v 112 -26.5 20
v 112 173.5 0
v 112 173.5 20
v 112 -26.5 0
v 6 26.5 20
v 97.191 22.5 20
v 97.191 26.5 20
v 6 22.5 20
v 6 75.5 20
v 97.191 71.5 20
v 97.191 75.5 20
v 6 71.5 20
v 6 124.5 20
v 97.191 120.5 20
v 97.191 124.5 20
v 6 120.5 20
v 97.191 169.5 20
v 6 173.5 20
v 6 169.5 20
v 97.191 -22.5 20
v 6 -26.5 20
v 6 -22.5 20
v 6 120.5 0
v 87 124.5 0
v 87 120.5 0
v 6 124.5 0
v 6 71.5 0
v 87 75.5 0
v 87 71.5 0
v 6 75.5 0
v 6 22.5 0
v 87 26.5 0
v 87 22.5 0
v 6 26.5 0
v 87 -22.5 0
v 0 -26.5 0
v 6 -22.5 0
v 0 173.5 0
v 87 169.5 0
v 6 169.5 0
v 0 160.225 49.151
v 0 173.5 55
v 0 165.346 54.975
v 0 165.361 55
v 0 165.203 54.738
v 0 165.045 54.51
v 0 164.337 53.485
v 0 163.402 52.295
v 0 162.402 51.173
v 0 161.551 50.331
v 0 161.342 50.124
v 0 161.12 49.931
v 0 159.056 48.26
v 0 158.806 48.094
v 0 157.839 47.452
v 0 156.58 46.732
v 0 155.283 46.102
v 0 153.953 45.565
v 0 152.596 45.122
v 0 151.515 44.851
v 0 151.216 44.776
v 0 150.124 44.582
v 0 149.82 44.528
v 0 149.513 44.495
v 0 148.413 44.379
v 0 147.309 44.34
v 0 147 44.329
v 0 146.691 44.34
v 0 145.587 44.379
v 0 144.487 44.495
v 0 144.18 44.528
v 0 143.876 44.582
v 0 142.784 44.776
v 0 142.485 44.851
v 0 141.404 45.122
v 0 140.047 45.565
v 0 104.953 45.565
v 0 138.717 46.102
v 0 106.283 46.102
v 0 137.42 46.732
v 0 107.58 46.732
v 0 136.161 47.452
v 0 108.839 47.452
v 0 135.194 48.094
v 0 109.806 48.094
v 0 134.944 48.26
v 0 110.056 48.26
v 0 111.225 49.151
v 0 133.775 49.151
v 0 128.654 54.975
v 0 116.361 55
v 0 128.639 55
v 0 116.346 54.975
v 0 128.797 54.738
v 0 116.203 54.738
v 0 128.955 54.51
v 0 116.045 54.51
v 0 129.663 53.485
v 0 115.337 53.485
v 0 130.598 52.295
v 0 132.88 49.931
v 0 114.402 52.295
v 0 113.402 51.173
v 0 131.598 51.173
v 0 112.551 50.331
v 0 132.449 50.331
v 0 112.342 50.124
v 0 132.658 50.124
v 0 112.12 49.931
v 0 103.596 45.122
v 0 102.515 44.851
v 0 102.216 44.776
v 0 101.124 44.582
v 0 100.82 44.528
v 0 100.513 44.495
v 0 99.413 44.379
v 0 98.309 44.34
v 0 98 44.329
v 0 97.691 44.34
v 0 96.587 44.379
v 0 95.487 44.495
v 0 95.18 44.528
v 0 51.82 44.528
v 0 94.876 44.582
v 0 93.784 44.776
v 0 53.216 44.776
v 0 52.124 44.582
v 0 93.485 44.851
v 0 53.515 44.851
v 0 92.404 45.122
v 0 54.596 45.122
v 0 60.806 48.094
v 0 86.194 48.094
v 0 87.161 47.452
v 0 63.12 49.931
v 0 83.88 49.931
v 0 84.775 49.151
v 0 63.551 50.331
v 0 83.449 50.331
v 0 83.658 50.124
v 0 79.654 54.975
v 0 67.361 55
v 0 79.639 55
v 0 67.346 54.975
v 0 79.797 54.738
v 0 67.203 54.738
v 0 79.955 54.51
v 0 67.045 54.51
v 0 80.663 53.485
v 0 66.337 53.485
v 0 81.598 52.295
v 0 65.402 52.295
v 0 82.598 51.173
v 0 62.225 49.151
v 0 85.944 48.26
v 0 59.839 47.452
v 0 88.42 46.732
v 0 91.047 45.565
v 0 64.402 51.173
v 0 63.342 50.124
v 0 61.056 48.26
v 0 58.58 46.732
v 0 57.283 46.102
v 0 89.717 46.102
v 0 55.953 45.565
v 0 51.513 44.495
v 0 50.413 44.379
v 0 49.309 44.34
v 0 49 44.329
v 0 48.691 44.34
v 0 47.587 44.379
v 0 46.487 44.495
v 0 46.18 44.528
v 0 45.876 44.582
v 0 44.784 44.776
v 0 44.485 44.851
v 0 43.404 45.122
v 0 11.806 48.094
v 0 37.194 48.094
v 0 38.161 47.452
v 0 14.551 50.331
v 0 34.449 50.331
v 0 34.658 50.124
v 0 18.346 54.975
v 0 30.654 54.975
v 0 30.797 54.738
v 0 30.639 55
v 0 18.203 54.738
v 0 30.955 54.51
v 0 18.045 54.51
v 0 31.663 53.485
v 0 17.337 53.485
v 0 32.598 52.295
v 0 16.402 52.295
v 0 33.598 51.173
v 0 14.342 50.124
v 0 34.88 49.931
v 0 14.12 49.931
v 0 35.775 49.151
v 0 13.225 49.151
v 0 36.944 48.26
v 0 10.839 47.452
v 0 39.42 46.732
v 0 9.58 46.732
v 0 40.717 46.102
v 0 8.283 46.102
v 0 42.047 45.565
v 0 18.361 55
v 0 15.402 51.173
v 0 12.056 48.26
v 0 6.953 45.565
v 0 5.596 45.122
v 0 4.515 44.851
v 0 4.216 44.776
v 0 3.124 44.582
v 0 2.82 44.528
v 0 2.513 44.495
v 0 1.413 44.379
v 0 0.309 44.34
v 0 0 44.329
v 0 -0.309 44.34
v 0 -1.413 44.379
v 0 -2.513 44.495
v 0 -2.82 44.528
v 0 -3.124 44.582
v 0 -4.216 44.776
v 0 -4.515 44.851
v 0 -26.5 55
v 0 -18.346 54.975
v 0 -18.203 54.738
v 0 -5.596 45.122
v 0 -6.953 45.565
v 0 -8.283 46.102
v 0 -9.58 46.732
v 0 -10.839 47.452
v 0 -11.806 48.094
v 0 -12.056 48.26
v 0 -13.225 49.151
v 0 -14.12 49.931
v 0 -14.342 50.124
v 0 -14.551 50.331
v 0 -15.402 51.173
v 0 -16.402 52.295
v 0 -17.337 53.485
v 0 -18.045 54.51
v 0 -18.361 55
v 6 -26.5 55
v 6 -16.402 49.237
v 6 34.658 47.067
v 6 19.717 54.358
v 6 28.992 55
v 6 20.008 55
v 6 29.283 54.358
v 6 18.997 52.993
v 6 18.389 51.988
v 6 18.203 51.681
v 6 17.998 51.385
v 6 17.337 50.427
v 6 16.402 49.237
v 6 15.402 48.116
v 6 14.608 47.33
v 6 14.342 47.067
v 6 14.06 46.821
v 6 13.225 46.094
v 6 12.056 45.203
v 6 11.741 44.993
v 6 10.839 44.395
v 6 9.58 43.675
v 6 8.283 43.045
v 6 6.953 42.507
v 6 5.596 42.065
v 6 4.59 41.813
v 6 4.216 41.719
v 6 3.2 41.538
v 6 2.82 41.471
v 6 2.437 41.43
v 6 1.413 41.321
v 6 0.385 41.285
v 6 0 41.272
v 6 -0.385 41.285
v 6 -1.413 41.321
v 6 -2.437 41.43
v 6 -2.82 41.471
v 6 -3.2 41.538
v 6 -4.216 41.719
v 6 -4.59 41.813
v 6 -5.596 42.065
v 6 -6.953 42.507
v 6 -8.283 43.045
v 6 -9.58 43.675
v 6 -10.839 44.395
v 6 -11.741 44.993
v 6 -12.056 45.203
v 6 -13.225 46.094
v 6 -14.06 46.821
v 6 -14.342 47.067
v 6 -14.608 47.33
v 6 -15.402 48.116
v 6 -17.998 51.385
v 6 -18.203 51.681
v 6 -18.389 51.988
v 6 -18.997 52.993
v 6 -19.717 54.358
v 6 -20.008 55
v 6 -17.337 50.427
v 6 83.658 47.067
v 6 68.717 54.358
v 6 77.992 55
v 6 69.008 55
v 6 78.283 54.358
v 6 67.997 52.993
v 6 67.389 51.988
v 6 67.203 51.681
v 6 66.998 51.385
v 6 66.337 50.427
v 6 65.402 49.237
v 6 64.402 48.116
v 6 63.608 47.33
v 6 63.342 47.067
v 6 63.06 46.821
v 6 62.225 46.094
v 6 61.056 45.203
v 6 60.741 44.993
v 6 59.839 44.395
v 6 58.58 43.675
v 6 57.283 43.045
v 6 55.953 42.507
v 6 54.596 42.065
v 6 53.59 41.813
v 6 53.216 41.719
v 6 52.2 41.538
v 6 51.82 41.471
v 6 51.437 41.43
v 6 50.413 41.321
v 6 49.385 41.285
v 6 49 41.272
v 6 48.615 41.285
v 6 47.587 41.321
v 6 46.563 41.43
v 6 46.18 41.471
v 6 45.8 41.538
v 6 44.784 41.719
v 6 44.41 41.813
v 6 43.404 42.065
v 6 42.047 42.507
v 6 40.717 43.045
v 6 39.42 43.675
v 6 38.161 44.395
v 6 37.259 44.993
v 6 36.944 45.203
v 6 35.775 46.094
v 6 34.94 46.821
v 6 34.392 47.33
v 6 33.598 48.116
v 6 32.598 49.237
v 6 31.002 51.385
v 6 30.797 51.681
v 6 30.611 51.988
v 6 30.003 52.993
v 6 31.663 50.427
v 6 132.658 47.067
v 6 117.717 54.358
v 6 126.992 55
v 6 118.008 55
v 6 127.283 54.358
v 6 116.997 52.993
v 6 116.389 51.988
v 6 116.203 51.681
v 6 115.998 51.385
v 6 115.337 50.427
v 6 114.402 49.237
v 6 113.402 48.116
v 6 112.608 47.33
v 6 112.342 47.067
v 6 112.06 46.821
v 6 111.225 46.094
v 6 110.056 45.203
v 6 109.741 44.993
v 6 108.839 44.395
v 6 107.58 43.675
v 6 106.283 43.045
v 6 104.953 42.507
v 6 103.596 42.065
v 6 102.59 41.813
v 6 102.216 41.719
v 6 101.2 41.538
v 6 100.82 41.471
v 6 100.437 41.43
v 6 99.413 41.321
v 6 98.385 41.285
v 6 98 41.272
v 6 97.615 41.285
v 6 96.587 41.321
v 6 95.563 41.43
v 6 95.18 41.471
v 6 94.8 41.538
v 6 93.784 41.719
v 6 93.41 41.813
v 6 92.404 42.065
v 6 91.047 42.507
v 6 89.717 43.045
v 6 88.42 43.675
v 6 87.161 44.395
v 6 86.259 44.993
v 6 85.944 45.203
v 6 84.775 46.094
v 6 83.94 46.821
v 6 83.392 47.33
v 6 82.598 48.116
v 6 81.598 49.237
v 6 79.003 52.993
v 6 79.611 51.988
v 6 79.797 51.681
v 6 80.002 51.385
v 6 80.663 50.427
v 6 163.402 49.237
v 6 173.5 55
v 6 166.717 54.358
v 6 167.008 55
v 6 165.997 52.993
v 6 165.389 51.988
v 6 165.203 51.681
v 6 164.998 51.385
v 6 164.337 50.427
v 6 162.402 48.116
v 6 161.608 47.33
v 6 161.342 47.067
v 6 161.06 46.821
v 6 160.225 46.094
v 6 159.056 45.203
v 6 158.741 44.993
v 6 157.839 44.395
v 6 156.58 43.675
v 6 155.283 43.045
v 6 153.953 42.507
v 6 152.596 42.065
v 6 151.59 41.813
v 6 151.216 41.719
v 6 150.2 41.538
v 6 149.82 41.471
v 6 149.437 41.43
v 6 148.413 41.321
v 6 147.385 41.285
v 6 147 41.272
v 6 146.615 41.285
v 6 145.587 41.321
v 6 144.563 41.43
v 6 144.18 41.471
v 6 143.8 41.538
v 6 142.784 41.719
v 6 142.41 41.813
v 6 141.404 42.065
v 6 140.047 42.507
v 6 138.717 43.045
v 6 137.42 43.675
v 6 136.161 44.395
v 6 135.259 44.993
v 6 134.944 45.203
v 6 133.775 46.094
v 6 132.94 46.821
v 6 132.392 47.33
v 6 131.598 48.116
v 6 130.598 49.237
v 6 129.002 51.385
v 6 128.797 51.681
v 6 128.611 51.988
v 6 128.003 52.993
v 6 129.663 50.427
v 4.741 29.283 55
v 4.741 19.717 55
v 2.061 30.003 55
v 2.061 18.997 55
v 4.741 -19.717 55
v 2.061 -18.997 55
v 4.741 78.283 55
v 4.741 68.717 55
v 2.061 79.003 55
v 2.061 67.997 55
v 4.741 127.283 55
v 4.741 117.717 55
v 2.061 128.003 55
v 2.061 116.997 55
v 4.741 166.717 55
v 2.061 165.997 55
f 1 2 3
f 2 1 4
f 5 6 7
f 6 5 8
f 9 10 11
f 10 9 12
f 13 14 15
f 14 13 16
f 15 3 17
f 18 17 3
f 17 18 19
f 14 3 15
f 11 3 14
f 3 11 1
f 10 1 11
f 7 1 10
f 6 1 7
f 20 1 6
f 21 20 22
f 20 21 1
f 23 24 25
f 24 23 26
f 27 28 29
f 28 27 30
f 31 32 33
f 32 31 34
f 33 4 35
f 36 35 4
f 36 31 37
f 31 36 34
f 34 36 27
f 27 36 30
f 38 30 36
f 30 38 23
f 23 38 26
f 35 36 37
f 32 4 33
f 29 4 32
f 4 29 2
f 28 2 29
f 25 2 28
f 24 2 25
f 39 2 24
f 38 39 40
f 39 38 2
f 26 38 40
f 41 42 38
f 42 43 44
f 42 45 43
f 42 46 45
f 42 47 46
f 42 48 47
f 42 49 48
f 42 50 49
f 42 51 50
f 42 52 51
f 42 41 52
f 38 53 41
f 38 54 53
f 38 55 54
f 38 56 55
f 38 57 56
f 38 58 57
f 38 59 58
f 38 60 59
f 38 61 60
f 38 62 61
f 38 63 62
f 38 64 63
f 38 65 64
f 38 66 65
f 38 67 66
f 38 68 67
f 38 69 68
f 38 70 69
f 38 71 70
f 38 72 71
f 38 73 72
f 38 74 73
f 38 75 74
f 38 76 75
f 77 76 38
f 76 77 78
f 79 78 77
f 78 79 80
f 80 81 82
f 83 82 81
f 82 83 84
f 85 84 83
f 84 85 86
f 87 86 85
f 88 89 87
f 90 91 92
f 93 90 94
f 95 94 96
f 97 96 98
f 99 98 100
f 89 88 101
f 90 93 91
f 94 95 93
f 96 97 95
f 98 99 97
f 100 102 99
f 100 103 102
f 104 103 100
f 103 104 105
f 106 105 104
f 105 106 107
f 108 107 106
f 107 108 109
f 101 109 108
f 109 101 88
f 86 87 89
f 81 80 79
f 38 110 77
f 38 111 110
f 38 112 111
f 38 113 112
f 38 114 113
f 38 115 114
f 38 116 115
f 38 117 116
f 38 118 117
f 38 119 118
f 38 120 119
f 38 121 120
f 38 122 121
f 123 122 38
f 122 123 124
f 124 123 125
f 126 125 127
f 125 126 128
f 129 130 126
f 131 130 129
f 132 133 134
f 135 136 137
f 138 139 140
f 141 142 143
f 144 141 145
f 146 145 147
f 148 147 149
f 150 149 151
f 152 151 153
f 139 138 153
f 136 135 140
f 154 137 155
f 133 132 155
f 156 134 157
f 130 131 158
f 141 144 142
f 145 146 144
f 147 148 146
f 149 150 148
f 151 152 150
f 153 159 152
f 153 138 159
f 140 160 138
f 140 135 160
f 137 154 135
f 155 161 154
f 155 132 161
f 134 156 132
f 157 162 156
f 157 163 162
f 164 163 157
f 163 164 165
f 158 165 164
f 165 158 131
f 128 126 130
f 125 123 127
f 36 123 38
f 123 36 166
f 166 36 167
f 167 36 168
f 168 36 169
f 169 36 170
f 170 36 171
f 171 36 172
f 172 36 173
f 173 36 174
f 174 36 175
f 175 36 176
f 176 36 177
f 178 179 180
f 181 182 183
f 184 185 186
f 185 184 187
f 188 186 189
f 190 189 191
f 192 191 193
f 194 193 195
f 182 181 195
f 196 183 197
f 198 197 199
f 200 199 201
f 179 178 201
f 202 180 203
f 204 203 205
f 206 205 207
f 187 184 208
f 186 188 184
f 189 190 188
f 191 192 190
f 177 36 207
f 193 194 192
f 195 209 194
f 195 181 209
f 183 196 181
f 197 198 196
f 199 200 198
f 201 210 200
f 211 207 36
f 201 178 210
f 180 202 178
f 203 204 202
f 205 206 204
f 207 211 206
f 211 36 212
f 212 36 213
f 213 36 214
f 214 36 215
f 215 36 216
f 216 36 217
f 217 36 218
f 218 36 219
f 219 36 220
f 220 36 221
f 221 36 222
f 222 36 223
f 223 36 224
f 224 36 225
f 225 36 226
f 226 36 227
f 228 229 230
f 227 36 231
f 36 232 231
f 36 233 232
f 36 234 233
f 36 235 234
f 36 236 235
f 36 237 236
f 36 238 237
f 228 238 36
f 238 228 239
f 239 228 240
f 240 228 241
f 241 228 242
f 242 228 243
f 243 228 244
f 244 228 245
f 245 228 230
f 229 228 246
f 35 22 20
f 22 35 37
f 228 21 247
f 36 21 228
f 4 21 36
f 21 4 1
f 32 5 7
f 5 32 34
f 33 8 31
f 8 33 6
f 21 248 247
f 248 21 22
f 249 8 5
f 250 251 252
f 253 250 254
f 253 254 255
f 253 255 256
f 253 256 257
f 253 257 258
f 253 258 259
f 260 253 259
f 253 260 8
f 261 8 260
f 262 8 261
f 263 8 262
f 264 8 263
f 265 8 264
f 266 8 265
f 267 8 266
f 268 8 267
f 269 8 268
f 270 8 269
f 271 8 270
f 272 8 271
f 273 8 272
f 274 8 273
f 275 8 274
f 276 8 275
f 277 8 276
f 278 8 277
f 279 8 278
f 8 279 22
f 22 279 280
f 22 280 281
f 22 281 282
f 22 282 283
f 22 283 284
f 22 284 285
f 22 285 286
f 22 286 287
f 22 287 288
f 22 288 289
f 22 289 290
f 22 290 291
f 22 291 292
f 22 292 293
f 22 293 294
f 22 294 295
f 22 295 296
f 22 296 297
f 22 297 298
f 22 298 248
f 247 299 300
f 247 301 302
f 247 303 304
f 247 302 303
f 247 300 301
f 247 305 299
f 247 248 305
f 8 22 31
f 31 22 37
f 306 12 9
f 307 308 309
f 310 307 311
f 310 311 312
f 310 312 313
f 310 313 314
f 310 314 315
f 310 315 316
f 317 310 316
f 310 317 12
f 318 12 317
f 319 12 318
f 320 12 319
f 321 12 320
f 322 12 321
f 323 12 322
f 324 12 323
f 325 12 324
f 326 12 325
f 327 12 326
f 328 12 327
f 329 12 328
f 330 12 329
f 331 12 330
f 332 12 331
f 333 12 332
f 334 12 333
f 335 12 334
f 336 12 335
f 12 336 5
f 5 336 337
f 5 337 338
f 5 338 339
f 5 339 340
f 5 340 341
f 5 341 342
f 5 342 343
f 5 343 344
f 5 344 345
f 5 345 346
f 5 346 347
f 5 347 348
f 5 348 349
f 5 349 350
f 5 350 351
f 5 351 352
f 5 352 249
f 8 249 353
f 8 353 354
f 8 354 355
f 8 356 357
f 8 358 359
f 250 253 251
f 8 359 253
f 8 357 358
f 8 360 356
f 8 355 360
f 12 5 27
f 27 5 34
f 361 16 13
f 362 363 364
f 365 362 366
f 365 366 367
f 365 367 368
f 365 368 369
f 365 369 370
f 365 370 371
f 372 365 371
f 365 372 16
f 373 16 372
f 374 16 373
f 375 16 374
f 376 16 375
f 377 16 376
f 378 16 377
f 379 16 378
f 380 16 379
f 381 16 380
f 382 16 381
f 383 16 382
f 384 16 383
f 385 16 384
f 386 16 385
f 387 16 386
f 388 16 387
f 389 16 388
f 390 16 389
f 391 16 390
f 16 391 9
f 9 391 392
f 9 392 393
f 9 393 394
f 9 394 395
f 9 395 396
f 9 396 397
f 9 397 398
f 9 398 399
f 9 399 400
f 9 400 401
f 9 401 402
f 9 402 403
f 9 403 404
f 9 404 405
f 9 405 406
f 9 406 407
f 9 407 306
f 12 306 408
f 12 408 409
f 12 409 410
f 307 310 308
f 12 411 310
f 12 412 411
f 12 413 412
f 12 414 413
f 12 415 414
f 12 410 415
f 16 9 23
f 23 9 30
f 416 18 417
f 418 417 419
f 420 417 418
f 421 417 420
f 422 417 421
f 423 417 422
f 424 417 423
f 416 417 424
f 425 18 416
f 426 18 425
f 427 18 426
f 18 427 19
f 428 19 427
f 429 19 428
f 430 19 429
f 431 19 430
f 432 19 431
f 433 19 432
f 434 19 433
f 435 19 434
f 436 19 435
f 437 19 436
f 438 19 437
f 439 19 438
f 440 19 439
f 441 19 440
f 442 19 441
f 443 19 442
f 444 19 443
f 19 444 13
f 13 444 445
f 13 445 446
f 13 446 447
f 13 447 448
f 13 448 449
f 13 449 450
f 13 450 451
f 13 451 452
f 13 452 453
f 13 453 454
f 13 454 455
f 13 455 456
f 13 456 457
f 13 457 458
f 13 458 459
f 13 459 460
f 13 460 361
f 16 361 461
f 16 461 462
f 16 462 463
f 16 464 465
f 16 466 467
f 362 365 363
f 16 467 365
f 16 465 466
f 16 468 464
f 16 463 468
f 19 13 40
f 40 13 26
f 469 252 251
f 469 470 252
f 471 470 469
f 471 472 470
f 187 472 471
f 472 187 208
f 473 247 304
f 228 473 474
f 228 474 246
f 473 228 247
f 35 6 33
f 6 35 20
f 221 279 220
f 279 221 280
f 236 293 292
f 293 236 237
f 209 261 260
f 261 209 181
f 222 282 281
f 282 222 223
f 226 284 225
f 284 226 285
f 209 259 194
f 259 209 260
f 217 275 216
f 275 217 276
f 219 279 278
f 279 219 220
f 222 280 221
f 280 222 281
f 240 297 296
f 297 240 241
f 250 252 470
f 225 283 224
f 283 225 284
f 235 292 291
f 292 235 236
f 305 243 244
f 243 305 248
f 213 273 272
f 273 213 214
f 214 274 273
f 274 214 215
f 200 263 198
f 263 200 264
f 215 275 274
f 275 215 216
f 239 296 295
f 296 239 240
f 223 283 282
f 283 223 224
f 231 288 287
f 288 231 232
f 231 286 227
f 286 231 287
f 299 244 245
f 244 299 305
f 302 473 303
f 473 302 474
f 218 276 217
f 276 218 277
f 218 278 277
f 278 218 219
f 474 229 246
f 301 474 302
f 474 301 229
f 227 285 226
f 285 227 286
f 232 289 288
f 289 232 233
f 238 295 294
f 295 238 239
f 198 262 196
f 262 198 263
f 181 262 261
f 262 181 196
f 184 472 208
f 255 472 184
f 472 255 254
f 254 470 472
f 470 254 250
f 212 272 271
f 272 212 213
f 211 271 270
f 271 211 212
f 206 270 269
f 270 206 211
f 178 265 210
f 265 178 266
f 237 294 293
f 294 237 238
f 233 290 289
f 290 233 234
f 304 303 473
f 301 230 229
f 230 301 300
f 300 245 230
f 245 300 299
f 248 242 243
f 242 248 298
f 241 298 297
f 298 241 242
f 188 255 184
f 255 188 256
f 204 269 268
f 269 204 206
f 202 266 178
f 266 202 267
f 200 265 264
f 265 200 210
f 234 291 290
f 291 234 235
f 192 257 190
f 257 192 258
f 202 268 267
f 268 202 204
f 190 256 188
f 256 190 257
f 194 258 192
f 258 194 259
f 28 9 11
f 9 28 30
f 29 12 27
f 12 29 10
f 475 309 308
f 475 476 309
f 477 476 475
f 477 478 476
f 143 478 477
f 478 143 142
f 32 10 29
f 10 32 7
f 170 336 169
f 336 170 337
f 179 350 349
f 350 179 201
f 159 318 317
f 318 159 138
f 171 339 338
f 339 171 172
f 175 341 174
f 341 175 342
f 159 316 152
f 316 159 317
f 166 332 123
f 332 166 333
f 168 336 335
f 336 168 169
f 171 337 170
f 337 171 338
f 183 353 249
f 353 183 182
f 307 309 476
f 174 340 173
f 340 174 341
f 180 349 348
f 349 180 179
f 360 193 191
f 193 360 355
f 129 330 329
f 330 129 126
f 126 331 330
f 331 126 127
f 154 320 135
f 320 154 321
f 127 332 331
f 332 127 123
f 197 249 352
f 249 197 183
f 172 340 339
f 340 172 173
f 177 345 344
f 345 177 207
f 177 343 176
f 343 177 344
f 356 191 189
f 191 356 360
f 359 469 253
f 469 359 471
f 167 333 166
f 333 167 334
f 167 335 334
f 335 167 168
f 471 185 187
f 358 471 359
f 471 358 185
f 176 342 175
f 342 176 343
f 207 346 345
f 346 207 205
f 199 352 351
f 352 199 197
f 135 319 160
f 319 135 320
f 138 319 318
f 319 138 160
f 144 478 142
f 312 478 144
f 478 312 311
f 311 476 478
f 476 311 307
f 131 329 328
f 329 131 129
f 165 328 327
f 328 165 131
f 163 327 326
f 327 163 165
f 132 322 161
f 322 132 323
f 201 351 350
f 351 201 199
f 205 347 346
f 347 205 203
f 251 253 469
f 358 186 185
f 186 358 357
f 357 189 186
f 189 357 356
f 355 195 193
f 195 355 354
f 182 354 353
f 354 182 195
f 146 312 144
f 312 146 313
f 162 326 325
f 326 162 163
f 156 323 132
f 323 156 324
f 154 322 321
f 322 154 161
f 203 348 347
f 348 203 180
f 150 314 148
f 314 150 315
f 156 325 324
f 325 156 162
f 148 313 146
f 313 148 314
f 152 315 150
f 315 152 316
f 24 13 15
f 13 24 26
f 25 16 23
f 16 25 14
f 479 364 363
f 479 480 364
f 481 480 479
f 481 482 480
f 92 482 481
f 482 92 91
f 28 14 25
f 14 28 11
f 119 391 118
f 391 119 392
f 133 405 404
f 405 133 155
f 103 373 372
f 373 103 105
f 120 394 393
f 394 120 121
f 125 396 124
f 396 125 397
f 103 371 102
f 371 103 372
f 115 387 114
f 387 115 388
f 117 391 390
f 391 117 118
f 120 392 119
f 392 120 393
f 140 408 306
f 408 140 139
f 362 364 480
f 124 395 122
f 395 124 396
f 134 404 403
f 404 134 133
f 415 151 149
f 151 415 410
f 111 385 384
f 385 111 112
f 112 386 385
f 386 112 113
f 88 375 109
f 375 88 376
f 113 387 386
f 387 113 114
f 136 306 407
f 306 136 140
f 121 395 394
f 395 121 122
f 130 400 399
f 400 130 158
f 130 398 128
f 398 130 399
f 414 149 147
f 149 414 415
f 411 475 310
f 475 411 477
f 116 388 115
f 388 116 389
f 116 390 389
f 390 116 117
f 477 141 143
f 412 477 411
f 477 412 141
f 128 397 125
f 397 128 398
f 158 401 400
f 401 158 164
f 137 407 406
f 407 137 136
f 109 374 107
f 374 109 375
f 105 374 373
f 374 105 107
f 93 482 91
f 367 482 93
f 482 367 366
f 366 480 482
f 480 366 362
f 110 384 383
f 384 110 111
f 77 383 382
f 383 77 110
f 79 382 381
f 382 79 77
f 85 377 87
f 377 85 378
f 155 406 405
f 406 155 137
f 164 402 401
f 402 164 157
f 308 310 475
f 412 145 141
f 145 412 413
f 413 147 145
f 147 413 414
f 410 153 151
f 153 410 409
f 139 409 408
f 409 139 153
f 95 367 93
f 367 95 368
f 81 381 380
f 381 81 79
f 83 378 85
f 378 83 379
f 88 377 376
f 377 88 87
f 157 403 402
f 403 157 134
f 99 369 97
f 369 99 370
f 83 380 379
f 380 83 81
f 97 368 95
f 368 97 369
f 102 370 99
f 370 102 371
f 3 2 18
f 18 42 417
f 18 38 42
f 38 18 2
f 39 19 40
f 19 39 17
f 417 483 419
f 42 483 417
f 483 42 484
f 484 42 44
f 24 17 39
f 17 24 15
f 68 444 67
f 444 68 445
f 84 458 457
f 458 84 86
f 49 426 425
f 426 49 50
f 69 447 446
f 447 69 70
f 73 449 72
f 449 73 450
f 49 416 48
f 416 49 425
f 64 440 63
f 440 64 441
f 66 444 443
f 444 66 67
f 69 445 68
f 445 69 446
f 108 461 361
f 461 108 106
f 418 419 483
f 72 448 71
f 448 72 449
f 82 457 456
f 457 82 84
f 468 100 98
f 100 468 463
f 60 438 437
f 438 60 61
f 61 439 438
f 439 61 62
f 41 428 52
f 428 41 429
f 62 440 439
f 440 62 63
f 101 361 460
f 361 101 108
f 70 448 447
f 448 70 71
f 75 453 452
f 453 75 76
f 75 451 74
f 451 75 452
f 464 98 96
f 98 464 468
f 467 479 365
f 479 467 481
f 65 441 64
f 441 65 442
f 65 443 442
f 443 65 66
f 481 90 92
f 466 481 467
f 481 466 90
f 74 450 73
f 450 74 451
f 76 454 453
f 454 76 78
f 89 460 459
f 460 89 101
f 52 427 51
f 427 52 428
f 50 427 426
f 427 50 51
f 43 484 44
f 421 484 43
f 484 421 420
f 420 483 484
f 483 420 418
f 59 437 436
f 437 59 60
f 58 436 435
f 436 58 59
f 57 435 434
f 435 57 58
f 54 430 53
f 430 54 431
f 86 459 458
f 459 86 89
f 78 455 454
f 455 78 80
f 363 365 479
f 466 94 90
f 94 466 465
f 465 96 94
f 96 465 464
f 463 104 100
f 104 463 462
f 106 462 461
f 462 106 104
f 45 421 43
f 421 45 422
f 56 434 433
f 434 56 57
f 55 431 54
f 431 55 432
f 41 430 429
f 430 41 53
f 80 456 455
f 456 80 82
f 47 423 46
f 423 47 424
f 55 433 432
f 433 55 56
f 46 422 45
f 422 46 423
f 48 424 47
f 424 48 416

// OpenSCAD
$fn = 100;
$fs = 0.01;
d1 = 112;
d2 = 25;
w1 = 4;
w2 = 45;
w3 = 6;

h1 = 20;
h2 = 55;
h3 = 125;

a = 63;

module one(i){
    w = w1+w2;
    ww = w1;
    translate([0,i*w,0]){
        difference()
        {
            union(){
                translate([0,-(w+ww)/2,0])
                cube([w3,w+ww,h2]);

                for (sign = [-1,1]){
                    translate([0,sign*(w2/2+ww/2)-ww/2,0])
                    cube([d1,ww,h1]);
                }

                rr = h1/sin(a);
                translate([(d1-d2),w/2,0])
                rotate(90,[1,0,0])
                linear_extrude(w)
                polygon([[0,0], [d2,0], [d2,h1], [rr*cos(a),h1]]);
            }

            r = w2/2;
            translate([r*cos(a)+(d1-d2),0,r*sin(a)])
            rotate(-a,[0,1,0])
            translate([0,0,$fs])
            cylinder(h3, r,r);
        }
    }
}

n = 4;
for (i = [0:n-1]){
    one(i);
}
